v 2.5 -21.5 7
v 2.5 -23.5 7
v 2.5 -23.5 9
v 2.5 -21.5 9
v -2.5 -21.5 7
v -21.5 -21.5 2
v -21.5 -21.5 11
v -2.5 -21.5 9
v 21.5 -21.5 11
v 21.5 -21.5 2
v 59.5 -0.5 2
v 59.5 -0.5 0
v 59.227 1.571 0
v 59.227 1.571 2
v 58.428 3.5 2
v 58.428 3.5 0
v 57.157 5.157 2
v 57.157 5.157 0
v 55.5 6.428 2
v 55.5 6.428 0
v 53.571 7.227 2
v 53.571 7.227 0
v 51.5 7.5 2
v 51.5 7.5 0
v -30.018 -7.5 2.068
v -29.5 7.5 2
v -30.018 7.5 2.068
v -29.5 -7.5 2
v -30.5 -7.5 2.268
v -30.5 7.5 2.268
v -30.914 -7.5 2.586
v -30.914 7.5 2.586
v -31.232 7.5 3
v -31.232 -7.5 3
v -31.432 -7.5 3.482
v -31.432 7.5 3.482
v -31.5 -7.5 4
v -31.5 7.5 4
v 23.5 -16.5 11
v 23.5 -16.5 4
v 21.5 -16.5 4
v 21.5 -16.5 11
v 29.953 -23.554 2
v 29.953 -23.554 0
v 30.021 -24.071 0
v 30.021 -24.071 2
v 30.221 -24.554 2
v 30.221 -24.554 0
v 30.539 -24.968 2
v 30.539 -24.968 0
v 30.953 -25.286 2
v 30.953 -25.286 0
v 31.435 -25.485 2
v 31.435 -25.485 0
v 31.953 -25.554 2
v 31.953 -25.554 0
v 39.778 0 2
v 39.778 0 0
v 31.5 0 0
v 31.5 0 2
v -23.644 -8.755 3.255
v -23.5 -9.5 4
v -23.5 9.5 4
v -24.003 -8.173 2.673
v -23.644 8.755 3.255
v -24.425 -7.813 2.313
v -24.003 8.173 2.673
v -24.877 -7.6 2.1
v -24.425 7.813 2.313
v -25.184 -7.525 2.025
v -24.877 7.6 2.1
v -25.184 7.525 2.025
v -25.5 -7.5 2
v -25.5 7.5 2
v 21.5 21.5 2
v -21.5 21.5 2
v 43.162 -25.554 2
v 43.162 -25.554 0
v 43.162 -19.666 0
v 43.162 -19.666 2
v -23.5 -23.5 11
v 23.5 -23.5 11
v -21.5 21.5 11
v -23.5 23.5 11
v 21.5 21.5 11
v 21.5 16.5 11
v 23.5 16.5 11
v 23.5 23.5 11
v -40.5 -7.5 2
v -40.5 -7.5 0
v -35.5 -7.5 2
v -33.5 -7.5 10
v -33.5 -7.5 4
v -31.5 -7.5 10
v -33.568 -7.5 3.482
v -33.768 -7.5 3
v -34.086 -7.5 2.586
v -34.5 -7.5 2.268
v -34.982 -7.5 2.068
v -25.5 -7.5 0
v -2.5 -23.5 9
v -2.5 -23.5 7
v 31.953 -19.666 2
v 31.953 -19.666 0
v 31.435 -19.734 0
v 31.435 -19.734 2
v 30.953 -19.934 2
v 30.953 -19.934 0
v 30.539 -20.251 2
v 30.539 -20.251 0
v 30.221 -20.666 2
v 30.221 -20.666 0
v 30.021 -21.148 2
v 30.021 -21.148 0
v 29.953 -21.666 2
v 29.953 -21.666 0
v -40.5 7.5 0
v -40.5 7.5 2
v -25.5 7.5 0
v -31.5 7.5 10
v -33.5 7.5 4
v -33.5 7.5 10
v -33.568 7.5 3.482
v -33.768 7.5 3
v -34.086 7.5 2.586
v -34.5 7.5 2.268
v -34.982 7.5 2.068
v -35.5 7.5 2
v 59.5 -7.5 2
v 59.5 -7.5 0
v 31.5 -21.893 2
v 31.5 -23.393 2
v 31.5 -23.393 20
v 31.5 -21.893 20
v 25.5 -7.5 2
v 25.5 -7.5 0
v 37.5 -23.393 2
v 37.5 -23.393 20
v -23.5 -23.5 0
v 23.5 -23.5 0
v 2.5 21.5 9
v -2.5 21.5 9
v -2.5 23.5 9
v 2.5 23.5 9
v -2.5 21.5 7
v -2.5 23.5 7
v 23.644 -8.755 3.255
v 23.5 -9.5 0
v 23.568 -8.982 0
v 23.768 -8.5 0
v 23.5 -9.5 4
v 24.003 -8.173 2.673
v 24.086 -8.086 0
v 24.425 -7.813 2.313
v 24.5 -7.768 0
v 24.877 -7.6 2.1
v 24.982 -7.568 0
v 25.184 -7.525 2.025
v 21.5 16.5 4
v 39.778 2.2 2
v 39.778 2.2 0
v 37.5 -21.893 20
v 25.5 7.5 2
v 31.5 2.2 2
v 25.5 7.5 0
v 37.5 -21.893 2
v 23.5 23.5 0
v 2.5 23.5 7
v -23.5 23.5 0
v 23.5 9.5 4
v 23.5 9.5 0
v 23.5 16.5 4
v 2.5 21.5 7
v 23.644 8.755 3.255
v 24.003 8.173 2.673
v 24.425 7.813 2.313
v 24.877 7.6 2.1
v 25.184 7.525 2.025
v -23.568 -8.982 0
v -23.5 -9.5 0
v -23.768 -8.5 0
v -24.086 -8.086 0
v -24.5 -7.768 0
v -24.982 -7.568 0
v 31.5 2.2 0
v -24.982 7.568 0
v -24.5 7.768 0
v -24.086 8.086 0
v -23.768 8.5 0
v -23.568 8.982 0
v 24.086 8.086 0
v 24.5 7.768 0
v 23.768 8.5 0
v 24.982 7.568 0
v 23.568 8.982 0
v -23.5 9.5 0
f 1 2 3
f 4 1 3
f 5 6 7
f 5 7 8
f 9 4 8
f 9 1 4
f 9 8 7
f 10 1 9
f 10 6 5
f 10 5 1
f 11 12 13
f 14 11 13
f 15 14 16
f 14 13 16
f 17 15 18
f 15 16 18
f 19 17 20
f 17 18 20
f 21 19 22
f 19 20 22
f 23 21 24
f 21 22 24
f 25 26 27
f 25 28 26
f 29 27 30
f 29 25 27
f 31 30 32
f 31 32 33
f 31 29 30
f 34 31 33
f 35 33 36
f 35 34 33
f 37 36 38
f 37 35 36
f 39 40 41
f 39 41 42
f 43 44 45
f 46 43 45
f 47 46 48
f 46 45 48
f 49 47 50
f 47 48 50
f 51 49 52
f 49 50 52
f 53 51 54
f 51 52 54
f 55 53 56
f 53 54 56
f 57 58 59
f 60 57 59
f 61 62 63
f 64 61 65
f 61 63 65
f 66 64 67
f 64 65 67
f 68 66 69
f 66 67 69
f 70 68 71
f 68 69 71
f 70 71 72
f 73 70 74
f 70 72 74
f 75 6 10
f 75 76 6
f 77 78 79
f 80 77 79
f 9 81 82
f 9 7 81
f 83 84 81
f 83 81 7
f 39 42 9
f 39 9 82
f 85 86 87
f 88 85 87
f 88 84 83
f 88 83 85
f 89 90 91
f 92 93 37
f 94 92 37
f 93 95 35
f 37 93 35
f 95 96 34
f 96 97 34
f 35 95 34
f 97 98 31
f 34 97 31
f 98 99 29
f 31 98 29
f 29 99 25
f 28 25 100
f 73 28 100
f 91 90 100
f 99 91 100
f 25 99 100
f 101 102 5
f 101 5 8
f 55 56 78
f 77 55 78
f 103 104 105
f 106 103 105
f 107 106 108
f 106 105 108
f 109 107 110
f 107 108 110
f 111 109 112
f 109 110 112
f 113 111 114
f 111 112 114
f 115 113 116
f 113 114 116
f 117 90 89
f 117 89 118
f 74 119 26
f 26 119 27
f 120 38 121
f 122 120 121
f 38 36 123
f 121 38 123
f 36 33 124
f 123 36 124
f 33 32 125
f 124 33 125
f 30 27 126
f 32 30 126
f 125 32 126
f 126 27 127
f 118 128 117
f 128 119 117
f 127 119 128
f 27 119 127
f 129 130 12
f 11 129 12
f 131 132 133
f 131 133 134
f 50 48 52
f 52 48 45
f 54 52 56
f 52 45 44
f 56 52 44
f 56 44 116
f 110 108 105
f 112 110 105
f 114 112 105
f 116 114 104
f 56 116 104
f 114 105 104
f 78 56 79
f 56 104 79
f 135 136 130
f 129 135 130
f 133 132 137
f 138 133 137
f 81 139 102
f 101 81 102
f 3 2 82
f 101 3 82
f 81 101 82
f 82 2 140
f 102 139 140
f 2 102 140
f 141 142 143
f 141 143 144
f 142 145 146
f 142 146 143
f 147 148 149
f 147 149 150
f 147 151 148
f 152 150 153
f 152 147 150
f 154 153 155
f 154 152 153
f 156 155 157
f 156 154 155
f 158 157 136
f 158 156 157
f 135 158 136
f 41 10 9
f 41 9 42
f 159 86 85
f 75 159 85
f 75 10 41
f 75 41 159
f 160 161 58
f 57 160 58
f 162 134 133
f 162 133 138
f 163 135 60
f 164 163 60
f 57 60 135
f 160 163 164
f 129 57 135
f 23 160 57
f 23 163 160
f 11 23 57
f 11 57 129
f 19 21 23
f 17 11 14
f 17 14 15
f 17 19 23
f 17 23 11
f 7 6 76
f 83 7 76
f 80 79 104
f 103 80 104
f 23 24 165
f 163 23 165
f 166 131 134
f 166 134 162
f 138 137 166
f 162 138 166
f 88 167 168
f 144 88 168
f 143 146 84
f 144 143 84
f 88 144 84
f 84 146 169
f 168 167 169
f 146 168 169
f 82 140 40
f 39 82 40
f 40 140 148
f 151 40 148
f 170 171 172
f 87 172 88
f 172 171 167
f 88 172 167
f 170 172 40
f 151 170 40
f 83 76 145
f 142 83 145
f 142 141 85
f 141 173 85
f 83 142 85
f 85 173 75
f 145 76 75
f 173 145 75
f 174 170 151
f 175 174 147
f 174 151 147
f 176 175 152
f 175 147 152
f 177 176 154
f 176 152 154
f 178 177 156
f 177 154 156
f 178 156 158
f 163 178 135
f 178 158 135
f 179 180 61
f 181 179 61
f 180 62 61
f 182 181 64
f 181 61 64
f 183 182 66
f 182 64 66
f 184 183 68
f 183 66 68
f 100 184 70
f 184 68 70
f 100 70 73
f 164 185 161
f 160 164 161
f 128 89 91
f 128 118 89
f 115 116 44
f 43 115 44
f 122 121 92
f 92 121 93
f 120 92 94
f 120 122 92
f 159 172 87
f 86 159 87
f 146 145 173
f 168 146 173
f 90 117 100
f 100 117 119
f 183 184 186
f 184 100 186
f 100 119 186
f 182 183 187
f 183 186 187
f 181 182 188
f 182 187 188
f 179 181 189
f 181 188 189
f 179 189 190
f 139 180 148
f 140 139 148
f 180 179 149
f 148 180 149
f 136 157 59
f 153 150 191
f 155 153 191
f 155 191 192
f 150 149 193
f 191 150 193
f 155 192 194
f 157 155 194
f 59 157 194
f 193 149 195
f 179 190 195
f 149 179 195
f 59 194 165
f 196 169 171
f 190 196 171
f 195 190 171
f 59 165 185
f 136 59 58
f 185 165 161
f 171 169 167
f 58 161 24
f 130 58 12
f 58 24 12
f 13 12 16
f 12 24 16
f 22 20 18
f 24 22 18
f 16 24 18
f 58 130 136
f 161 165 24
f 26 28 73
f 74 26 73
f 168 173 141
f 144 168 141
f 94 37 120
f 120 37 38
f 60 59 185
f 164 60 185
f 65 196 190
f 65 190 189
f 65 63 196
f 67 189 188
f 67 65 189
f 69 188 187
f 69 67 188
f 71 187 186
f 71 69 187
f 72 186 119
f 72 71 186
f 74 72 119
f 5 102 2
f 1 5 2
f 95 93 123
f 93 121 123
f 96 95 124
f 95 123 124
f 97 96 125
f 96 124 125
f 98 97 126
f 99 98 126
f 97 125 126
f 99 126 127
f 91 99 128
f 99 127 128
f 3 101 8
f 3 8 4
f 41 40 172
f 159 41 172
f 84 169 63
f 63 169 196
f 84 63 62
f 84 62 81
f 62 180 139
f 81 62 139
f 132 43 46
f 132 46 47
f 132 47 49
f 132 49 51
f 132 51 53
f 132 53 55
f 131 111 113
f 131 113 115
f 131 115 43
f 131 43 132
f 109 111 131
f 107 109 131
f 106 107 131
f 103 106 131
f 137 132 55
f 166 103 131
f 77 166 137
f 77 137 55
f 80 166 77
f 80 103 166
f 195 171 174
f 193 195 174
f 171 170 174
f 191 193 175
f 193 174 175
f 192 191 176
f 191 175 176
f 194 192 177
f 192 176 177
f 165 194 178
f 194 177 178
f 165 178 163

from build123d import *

# Parameters (mm, degrees)
F0_W      = 43
F0_H      = 43
F0_W_2    = 8
F0_H_2    = 13
F0_H_3    = 2
F0_W_3    = 7
F0_H_4    = 15
F1_DEPTH  = 2
F2_DEPTH  = 10
F3_DEPTH  = 11
F4_W      = 33
F4_H      = 7
F5_DEPTH  = 25
F6_R      = 1.99999
F7_DEPTH  = 25
F8_W      = 5
F8_H      = 2
F9_DEPTH  = 47.001
F10_W     = 6
F10_H     = 1.5
F11_DEPTH = 20
F12_DEPTH = 2


# Not quite as in the source:
# - a fillet or chamfer is up to 0.001 mm smaller than in the source, because OpenCascade refuses the exact size


with BuildPart() as f1:
    # F0 (on Top) → F1 (new body)
    with BuildSketch(Plane.XY):
        Polygon((23.5, -7.5), (40.5, -7.5), (59.5, -7.5), (59.5, -5.5), (36.5, -5.5), (23.5, -5.5), align=None)
        Polygon((23.5, -23.5), (23.5, -7.5), (23.5, -5.5), (23.5, 7.5), (23.5, 23.5), (-23.5, 23.5), (-23.5, 7.5), (-23.5, 5.5), (-23.5, -7.5), (-23.5, -23.5), align=None)
        Rectangle(F0_W, F0_H, mode=Mode.SUBTRACT)
        Polygon((23.5, 7.5), (23.5, -5.5), (36.5, -5.5), (36.5, 0), (31.5, 0), (31.5, 2.2), (36.5, 2.2), (36.5, 7.5), align=None)
        with BuildLine():
            Line((36.5, -5.5), (59.5, -5.5))
            Line((59.5, -5.5), (59.5, -0.5))
            ThreePointArc((59.5, -0.5), (57.1568542495, 5.1568542495), (51.5, 7.5))
            Line((51.5, 7.5), (40.5, 7.5))
            Line((40.5, 7.5), (36.5, 7.5))
            Line((36.5, 7.5), (36.5, 2.2))
            Line((36.5, 2.2), (39.7782735527, 2.2))
            Line((39.7782735527, 2.2), (39.7782735527, 0))
            Line((39.7782735527, 0), (36.5, 0))
            Line((36.5, 0), (36.5, -5.5))
        make_face()
        with Locations((-27.5, -1)):
            Rectangle(F0_W_2, F0_H_2)
        Polygon((-33.5, -7.5), (-31.5, -7.5), (-31.5, 5.5), (-31.5, 7.5), (-33.5, 7.5), align=None)
        with Locations((-27.5, 6.5)):
            Rectangle(F0_W_2, F0_H_3)
        with Locations((-37, 0)):
            Rectangle(F0_W_3, F0_H_4)
        Rectangle(F0_W, F0_H)
    extrude(amount=F1_DEPTH)

    # F0 (on Top) → F2 (join)
    with BuildSketch(Plane.XY):
        Polygon((-33.5, -7.5), (-31.5, -7.5), (-31.5, 5.5), (-31.5, 7.5), (-33.5, 7.5), align=None)
    extrude(amount=F2_DEPTH)

    # F0 (on Top) → F3 (join)
    with BuildSketch(Plane.XY):
        Polygon((23.5, -23.5), (23.5, -7.5), (23.5, -5.5), (23.5, 7.5), (23.5, 23.5), (-23.5, 23.5), (-23.5, 7.5), (-23.5, 5.5), (-23.5, -7.5), (-23.5, -23.5), align=None)
        Rectangle(F0_W, F0_H, mode=Mode.SUBTRACT)
    extrude(amount=F3_DEPTH)

    # F4 (on face) → F5 (cut)
    with BuildSketch(Plane.YZ.offset(23.5)):
        with Locations((0, 7.5)):
            Rectangle(F4_W, F4_H)
    extrude(amount=-F5_DEPTH, mode=Mode.SUBTRACT)

    # F6 (radius 2 in the source; OpenCascade refuses exactly that, so slightly less here)
    f6_edges = [f1.edges().sort_by_distance(p)[0] for p in [
        (-23.5, 0, 2),
        (-31.5, 0, 2),
        (23.5, 0, 2),
        (-33.5, 0, 2),
        (23.5, 7.5, 1),
        (-23.5, -7.5, 1),
        (23.5, -7.5, 1),
        (-23.5, 7.5, 1),
    ]]
    fillet(f6_edges, radius=F6_R)

    # F0 (on Top) → F7 (cut)
    with BuildSketch(Plane.XY):
        Polygon((31.5, 0), (36.5, 0), (39.7782735527, 0), (39.7782735527, 2.2), (36.5, 2.2), (31.5, 2.2), align=None)
    extrude(amount=-F7_DEPTH, mode=Mode.SUBTRACT)

    # F8 (on face) → F9 (cut, through all)
    with BuildSketch(Plane.XZ.offset(23.5)):
        with Locations((0, 8)):
            Rectangle(F8_W, F8_H)
    extrude(amount=-F9_DEPTH, mode=Mode.SUBTRACT)


with BuildPart() as f11:
    # F10 (on Top) → F11 (new body)
    with BuildSketch(Plane.XY):
        with Locations((34.5, -22.6426791698)):
            Rectangle(F10_W, F10_H)
    extrude(amount=F11_DEPTH)

    # F10 (on Top) → F12 (join)
    with BuildSketch(Plane.XY):
        with BuildLine():
            Line((43.161662899, -19.6656095535), (31.9530290067, -19.6656095535))
            ThreePointArc((31.9530290067, -19.6656095535), (30.5388154443, -20.2513959911), (29.9530290067, -21.6656095535))
            Line((29.9530290067, -21.6656095535), (29.9530290067, -23.5535977408))
            ThreePointArc((29.9530290067, -23.5535977408), (30.5388154443, -24.9678113032), (31.9530290067, -25.5535977408))
            Line((31.9530290067, -25.5535977408), (43.161662899, -25.5535977408))
            Line((43.161662899, -25.5535977408), (43.161662899, -19.6656095535))
        make_face()
        with Locations((34.5, -22.6426791698)):
            Rectangle(F10_W, F10_H, mode=Mode.SUBTRACT)
    extrude(amount=F12_DEPTH)


solid = Compound([f1.part, f11.part])
